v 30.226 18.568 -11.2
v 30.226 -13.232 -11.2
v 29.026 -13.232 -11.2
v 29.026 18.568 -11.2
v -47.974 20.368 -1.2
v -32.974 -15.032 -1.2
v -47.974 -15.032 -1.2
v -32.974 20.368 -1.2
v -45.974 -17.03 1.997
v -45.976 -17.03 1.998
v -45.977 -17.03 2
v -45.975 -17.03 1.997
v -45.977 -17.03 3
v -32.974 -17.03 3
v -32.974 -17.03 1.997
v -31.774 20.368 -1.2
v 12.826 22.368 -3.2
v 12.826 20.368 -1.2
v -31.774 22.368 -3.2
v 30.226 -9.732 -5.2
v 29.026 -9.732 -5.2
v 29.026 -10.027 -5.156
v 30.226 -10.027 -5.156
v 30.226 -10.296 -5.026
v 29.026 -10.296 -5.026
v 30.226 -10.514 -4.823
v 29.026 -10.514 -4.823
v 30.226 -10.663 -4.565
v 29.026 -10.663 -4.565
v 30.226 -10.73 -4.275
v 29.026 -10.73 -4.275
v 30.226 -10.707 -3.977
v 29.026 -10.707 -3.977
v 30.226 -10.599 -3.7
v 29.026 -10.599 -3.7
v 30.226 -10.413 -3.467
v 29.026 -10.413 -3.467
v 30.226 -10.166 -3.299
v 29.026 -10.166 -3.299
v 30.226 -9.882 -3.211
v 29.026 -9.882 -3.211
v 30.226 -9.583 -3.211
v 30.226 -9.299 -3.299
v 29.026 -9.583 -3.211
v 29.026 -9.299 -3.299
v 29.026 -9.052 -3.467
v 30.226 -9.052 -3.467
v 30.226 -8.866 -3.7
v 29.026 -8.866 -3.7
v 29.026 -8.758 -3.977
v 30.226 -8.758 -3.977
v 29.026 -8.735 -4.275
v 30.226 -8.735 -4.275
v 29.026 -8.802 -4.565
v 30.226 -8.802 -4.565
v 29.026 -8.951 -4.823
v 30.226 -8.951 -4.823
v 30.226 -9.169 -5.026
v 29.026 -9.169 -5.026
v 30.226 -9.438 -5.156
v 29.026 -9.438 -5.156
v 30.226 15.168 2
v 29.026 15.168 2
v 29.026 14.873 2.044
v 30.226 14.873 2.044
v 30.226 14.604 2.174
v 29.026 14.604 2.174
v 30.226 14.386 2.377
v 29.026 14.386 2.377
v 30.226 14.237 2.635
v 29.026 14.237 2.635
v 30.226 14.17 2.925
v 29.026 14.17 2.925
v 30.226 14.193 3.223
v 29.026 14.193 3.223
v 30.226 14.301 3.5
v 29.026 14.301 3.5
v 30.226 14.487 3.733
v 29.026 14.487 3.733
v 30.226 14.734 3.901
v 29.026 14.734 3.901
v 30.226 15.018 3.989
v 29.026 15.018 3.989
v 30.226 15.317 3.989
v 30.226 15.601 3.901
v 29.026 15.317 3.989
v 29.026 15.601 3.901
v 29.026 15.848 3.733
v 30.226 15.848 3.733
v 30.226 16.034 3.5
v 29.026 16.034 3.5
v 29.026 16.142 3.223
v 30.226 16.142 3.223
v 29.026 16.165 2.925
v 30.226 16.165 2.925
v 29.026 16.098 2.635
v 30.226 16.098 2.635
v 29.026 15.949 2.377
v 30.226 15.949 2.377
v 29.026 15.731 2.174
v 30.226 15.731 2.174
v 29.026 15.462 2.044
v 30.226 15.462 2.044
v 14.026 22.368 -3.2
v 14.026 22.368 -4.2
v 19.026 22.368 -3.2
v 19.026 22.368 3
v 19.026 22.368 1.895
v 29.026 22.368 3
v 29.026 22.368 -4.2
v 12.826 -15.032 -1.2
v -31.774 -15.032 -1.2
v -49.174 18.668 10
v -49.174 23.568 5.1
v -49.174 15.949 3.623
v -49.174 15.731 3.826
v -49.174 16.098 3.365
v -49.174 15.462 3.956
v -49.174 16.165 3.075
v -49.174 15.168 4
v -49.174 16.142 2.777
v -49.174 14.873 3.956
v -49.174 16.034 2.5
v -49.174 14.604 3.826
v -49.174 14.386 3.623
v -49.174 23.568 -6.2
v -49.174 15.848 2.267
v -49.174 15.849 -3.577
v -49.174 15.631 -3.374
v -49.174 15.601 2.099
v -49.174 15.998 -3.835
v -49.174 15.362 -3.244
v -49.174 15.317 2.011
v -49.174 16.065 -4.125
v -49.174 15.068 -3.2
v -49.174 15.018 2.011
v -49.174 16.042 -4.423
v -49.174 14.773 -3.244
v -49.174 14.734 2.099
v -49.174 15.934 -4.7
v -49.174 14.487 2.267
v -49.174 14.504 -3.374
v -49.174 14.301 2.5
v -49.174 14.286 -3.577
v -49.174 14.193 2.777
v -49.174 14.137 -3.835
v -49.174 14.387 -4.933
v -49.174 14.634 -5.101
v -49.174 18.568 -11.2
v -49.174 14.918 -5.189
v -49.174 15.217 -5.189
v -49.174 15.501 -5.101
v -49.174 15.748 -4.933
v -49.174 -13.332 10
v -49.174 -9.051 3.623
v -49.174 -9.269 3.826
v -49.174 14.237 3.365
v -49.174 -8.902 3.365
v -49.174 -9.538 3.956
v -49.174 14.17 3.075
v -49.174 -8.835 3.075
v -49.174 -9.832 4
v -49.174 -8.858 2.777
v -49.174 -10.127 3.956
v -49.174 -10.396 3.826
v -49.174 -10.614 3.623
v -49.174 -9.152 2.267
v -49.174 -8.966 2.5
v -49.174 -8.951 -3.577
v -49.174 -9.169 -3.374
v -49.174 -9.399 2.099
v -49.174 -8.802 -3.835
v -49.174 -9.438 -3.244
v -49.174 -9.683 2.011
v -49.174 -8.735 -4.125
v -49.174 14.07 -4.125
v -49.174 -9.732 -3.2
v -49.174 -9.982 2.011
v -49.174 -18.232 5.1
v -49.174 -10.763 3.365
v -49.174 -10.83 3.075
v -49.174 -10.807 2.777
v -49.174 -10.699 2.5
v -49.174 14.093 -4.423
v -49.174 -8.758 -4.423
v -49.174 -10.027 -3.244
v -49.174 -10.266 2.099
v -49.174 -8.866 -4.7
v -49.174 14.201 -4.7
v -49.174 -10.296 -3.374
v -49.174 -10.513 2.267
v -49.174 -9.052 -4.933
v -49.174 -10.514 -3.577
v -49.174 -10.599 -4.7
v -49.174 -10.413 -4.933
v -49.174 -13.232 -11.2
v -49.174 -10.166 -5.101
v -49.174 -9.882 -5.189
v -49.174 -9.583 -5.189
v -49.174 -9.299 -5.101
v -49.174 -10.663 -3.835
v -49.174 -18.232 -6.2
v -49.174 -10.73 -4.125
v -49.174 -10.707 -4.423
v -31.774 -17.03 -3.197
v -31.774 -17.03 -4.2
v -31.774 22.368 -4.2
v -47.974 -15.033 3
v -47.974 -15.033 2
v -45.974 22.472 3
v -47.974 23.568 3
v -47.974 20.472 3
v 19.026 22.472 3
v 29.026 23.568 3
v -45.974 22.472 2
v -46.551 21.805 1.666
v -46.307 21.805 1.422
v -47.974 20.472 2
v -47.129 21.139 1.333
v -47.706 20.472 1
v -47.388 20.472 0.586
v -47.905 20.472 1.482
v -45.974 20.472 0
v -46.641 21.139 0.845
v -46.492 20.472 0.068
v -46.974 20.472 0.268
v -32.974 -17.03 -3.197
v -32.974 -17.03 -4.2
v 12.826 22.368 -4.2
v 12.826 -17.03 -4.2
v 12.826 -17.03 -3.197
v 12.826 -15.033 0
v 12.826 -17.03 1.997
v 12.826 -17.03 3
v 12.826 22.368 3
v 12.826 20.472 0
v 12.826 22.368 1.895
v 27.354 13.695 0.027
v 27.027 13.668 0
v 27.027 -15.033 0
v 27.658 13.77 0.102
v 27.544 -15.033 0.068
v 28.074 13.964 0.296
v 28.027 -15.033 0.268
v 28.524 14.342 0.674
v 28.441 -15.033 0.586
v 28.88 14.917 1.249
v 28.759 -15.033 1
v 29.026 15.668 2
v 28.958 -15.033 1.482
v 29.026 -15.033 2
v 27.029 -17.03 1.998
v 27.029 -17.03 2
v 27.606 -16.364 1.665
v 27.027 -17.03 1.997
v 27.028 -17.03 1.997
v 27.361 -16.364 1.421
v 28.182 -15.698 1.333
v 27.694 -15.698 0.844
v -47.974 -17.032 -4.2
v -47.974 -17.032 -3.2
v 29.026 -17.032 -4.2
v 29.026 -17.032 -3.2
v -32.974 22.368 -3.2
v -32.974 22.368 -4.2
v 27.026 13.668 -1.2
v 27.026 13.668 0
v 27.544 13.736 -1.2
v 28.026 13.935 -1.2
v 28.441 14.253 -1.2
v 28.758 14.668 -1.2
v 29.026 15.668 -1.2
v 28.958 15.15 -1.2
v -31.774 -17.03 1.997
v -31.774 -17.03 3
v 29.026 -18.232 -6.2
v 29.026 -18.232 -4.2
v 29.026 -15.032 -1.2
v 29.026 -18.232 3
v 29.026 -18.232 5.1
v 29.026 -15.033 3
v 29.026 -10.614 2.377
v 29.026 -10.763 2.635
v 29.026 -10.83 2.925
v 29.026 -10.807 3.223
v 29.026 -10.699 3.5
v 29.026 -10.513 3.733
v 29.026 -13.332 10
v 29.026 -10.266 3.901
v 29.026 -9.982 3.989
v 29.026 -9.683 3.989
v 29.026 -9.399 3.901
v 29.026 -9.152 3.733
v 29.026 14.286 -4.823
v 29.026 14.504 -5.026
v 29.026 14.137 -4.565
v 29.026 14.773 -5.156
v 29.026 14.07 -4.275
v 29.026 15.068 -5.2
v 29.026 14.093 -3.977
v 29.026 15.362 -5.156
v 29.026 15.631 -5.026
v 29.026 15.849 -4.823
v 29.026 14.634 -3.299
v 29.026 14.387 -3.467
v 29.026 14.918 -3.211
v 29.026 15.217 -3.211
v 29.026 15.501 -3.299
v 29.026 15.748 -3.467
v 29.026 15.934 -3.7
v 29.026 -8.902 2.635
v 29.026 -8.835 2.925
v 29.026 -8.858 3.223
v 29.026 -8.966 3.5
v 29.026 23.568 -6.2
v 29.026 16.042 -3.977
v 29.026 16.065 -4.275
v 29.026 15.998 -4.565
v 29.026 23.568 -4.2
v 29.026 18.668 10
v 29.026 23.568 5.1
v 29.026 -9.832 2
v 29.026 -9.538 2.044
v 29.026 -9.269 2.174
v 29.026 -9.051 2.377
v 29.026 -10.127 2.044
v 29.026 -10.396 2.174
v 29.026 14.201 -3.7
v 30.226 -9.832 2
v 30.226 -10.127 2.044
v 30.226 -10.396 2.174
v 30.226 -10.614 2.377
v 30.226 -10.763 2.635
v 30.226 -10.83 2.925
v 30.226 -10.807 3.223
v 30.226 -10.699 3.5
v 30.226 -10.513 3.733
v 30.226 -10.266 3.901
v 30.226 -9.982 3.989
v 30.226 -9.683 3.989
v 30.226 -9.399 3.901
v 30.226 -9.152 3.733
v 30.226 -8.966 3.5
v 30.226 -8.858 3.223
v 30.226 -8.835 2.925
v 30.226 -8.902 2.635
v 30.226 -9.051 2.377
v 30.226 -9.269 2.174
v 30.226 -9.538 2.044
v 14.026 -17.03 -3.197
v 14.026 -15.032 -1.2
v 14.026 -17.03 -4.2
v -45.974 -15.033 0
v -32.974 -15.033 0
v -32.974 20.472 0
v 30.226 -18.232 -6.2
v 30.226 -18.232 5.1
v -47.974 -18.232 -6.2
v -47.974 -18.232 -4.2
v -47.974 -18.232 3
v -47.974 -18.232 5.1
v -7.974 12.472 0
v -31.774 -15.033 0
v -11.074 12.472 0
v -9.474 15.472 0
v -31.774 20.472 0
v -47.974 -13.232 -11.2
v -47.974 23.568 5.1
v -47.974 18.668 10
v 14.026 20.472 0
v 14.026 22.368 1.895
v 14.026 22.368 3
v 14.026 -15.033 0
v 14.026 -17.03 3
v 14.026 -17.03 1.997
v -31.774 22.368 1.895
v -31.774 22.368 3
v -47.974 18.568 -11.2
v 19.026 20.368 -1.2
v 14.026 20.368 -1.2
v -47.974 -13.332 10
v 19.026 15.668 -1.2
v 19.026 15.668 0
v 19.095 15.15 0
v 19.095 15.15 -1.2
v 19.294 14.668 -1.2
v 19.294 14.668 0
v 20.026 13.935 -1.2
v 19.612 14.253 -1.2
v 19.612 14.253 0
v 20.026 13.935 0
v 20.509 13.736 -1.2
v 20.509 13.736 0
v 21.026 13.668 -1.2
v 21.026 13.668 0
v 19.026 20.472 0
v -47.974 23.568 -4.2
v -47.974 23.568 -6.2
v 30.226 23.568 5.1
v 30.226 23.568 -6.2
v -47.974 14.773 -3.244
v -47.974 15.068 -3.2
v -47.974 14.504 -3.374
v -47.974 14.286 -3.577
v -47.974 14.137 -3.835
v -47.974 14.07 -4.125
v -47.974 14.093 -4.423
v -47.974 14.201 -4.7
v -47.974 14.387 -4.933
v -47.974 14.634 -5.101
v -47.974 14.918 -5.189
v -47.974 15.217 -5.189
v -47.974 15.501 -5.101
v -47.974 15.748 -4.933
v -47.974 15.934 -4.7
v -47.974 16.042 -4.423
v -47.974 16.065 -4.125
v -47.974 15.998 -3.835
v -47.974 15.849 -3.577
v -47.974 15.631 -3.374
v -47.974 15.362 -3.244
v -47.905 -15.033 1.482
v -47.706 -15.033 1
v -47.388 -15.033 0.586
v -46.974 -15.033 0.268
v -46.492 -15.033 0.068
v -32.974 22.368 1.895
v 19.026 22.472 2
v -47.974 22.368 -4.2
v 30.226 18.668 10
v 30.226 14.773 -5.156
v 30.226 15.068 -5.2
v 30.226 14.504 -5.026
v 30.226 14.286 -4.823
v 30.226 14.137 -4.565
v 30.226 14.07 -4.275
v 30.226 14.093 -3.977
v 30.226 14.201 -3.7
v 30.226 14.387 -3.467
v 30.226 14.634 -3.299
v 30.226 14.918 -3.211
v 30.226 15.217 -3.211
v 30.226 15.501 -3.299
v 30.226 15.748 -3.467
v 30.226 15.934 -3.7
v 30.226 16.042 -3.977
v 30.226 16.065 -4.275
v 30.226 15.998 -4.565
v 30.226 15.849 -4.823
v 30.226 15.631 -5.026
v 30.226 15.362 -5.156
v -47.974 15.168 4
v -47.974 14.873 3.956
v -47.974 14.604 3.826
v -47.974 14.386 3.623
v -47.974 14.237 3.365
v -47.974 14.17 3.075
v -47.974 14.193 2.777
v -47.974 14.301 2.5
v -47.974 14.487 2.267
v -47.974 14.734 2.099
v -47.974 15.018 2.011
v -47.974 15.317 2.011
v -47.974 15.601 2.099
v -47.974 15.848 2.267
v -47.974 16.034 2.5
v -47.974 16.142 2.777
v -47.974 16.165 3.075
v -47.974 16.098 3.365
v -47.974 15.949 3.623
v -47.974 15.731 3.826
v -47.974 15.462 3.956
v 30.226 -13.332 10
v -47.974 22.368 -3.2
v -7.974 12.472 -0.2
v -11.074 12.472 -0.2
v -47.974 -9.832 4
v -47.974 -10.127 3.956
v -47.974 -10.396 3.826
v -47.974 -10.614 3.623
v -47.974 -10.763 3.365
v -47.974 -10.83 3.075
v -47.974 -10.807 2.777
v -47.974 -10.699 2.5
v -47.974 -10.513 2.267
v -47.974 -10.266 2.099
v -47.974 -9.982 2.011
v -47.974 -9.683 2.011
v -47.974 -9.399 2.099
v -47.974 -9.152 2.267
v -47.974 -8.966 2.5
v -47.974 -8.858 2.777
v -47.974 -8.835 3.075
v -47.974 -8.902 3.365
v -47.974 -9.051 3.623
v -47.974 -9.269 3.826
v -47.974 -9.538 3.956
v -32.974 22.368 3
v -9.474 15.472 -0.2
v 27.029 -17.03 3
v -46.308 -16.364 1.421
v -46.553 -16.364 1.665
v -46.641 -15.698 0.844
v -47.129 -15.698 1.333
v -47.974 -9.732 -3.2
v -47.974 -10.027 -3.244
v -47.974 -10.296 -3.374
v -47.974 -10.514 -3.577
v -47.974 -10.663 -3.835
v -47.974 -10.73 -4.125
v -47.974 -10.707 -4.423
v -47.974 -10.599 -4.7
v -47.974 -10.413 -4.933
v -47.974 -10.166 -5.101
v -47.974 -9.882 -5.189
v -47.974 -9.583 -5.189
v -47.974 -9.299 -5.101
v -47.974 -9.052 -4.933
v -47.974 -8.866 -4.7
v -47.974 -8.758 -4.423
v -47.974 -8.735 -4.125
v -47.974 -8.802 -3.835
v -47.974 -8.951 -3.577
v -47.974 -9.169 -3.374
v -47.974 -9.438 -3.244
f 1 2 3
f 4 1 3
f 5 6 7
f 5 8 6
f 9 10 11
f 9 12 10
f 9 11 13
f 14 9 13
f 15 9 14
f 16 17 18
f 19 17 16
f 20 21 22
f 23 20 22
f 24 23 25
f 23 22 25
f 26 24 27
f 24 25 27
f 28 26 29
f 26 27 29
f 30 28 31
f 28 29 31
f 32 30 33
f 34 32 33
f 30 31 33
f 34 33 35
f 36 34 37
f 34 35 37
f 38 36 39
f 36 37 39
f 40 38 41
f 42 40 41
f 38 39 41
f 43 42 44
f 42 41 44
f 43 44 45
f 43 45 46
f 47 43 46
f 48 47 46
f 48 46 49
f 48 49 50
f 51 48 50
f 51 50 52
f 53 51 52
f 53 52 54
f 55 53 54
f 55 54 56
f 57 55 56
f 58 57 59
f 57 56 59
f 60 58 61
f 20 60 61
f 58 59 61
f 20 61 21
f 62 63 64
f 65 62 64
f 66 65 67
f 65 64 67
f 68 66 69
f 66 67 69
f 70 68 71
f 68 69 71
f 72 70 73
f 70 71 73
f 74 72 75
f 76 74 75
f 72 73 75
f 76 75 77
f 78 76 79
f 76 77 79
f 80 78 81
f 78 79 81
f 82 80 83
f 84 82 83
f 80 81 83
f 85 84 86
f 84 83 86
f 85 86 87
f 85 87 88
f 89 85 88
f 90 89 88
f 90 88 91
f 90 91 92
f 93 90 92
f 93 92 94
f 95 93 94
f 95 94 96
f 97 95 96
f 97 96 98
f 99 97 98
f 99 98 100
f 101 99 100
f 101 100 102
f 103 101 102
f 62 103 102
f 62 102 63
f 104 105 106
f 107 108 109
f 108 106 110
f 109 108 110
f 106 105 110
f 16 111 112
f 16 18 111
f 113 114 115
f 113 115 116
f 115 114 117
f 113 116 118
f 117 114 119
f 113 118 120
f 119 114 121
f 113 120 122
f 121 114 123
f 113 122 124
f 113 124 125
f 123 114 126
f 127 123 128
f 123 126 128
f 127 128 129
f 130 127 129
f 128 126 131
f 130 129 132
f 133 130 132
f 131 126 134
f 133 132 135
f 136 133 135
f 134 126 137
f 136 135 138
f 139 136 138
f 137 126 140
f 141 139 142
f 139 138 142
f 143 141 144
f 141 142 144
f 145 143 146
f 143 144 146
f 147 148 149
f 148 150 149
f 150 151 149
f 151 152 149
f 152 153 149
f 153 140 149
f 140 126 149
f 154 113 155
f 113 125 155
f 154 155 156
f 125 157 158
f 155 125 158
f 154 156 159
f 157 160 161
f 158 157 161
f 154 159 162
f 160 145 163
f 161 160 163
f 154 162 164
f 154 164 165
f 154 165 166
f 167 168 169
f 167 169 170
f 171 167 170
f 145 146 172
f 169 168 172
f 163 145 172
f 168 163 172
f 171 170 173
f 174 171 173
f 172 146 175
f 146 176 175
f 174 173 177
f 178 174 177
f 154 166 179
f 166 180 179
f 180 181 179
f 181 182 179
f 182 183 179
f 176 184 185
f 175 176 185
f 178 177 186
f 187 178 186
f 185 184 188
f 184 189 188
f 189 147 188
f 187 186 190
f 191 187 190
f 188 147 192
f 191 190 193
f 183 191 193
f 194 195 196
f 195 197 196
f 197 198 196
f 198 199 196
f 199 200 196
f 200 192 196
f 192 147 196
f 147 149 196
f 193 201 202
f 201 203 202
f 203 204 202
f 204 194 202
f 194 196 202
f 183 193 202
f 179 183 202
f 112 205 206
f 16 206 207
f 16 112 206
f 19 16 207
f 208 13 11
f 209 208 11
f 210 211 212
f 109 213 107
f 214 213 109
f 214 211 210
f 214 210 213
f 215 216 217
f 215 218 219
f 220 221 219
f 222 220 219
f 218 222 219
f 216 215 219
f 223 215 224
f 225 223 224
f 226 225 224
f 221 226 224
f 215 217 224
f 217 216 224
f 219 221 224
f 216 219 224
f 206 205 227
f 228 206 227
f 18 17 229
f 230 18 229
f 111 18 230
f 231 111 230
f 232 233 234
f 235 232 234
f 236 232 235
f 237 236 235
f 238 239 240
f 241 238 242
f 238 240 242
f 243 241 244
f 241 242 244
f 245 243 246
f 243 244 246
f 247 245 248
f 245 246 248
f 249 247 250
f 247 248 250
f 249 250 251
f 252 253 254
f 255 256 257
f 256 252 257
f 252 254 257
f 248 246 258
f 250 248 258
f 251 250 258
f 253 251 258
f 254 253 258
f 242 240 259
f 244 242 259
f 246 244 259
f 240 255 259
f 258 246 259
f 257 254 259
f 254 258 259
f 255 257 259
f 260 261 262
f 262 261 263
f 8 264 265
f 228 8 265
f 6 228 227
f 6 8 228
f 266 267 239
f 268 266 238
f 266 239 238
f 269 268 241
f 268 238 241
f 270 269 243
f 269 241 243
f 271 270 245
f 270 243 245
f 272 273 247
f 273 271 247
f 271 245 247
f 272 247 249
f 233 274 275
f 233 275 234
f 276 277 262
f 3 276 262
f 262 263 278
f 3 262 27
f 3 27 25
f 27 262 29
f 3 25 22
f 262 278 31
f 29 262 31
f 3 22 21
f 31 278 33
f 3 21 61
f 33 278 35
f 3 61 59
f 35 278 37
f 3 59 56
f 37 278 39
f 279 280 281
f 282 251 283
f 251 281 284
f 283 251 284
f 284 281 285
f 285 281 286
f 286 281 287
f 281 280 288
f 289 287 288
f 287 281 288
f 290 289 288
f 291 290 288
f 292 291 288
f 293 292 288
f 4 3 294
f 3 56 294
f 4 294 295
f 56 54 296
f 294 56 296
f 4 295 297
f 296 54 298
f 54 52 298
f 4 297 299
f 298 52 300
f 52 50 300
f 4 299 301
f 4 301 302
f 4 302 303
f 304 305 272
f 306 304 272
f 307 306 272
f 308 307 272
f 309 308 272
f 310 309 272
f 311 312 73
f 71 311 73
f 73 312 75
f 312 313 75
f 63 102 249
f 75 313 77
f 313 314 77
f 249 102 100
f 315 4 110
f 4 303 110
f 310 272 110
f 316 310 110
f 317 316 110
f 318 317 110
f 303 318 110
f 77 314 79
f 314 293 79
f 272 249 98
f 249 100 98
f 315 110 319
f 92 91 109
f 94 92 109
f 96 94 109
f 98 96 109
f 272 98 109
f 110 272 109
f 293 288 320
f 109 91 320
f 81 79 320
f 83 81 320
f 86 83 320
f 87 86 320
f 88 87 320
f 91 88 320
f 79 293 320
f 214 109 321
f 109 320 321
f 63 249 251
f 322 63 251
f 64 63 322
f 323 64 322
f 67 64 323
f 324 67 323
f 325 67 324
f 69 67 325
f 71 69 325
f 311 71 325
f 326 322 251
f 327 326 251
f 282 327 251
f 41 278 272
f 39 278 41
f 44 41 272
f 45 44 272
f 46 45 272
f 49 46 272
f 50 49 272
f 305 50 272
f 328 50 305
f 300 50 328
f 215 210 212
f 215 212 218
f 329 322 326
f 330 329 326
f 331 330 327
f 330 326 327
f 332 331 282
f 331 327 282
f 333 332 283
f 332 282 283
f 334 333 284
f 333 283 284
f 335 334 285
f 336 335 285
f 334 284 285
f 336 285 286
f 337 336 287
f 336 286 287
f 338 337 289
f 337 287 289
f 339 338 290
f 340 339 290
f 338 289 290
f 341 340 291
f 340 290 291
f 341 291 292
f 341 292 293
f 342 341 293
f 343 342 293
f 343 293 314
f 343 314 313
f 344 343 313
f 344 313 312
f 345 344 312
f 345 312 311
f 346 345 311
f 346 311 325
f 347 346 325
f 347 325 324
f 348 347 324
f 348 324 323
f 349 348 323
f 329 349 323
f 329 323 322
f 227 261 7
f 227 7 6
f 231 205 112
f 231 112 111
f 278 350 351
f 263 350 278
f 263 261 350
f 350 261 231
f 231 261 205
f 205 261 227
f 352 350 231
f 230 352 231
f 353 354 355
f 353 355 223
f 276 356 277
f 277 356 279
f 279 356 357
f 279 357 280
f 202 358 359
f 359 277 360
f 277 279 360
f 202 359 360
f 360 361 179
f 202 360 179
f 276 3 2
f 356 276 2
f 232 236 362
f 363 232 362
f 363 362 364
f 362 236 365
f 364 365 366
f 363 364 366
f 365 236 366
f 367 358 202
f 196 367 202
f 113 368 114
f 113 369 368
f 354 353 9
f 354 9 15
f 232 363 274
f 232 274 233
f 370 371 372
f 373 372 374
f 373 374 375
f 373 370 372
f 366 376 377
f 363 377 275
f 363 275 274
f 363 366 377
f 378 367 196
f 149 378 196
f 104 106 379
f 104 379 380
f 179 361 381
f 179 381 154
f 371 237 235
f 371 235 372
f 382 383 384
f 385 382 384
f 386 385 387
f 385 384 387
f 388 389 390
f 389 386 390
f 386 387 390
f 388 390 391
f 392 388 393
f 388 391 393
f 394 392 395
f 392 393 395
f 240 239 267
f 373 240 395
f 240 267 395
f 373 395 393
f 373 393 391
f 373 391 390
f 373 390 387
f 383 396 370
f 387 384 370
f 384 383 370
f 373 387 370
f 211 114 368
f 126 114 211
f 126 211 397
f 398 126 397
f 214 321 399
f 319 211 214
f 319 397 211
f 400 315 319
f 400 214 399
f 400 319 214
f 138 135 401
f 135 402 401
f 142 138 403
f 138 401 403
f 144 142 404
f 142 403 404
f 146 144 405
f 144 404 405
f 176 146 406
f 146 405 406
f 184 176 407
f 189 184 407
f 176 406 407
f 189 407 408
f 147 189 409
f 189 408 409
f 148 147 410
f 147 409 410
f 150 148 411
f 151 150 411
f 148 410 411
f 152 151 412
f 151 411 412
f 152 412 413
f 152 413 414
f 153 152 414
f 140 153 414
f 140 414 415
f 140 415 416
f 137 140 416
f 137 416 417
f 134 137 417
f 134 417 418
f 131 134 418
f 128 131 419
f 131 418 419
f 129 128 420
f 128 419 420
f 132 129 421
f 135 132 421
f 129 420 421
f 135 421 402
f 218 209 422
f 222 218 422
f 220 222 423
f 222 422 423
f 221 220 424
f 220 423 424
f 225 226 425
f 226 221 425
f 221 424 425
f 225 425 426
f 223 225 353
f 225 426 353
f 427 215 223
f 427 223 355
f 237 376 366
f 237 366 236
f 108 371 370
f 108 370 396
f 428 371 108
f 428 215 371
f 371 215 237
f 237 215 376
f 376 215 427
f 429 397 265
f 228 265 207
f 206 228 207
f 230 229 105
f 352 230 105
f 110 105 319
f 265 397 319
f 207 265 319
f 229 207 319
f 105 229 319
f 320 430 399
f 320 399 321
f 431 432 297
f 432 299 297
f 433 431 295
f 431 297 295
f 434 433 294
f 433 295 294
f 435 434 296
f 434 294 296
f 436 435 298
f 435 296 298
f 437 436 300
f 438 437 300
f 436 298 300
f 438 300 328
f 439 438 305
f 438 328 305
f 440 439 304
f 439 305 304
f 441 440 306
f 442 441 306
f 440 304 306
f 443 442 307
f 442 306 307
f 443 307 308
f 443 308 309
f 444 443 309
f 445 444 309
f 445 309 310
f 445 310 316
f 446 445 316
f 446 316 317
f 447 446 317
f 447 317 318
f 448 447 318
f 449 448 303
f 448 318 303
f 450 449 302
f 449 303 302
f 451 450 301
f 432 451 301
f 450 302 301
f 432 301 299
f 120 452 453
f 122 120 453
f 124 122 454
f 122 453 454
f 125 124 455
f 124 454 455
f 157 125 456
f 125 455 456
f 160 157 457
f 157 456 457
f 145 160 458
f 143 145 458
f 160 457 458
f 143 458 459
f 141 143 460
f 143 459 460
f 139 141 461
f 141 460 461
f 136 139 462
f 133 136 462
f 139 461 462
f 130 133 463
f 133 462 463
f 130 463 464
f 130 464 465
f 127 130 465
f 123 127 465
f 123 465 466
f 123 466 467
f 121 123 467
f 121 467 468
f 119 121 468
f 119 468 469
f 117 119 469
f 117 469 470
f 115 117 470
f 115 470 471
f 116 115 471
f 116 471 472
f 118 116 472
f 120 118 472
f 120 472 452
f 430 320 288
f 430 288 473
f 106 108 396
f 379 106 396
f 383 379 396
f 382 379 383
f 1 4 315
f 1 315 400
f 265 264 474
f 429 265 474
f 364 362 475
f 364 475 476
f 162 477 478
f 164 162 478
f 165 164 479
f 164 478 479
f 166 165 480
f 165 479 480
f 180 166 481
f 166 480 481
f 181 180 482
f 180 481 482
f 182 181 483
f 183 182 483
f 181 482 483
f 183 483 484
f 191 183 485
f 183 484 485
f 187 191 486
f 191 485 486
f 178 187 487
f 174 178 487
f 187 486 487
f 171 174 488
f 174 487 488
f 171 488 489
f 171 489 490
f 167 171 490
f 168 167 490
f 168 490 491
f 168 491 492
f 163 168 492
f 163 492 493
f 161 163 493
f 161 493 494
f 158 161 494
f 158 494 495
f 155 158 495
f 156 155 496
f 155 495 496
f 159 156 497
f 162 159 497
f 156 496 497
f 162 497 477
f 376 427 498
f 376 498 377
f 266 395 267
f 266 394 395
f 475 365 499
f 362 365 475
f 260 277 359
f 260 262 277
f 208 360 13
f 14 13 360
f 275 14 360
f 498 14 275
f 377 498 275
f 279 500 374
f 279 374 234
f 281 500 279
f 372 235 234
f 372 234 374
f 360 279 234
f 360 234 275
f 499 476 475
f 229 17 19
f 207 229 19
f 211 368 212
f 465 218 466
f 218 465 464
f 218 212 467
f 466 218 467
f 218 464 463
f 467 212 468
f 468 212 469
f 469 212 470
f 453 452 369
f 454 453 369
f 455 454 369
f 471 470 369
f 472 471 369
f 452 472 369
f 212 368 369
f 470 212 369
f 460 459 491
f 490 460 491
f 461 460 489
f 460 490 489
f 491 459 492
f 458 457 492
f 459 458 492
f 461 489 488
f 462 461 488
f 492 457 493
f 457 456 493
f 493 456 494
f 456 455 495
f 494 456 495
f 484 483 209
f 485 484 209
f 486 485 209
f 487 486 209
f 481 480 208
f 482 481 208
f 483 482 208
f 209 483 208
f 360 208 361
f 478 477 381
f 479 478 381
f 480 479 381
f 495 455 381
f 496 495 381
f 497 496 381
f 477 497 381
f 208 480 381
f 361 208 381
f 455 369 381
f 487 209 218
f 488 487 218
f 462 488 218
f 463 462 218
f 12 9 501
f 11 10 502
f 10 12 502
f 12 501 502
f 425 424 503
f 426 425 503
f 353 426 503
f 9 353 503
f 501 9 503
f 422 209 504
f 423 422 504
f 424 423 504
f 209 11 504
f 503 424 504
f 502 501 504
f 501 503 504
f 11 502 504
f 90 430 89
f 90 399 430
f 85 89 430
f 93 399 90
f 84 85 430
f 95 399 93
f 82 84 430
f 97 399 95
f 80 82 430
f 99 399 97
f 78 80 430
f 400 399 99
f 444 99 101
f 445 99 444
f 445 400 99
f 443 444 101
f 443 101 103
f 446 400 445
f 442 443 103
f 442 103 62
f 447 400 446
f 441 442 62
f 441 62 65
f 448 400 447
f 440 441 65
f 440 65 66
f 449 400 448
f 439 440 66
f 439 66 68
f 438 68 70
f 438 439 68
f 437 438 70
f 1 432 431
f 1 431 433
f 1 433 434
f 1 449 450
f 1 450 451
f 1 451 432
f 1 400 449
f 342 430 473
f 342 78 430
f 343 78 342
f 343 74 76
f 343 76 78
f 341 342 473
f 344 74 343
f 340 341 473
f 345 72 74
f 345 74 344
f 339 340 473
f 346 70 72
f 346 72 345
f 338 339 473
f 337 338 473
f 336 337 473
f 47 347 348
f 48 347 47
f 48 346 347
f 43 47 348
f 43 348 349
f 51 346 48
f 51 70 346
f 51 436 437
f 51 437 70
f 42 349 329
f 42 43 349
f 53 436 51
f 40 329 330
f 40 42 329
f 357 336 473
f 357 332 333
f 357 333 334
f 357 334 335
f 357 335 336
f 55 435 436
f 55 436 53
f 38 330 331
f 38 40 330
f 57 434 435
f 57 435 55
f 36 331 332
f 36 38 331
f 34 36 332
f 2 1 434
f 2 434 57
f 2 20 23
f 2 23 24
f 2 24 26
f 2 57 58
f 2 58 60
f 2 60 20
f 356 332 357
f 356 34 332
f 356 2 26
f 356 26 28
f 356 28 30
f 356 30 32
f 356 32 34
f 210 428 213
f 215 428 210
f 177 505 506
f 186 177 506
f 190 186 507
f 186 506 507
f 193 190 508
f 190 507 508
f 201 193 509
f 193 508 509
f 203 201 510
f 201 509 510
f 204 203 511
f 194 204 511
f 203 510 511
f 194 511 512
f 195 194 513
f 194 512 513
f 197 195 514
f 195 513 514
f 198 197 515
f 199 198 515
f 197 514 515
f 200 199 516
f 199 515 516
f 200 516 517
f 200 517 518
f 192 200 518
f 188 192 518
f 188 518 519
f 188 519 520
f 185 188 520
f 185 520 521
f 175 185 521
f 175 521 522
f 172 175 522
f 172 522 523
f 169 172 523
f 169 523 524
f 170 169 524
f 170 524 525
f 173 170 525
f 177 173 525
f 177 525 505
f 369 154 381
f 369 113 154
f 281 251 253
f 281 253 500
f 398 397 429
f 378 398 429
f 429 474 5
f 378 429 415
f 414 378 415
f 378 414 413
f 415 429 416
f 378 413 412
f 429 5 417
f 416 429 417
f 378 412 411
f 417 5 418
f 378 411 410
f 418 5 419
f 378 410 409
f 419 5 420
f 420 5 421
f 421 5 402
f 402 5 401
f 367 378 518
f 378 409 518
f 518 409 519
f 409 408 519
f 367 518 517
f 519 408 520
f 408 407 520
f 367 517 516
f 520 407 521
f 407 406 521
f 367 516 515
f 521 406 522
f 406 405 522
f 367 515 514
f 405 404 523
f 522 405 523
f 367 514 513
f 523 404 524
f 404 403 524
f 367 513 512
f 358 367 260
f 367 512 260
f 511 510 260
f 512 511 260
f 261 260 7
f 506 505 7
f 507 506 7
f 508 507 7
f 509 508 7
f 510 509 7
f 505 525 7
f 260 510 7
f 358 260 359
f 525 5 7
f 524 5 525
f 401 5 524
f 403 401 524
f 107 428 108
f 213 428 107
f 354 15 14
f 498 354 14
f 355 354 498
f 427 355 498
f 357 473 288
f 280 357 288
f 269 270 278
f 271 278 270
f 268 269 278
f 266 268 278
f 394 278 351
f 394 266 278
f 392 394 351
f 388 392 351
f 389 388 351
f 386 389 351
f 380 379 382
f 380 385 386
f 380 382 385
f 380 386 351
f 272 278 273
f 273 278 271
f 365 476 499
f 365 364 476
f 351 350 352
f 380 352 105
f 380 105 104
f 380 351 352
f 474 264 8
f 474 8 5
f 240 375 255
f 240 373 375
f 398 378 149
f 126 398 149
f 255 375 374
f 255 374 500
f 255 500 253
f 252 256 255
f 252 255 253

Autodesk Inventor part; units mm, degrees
ref_plane "YZ Plane" through (0, 0, 0) normal (1, 0, 0) x (0, 1, 0)
ref_plane "XZ Plane" through (0, 0, 0) normal (0, 1, 0) x (-1, 0, 0)
ref_plane "XY Plane" through (0, 0, 0) normal (0, 0, 1) x (1, 0, 0)
sketch "Sketch1" plane through (0, 0, 0) normal (0, 0, 1) x (1, 0, 0)
  line L0 (-49.4736, 23.6675) -> (30.5264, 23.6675)
  line L1 (30.5264, 23.6675) -> (30.5264, -18.3325)
  line L2 (30.5264, -18.3325) -> (-49.4736, -18.3325)
  line L3 (-49.4736, -18.3325) -> (-49.4736, 23.6675)
  line L4 (-47.9736, 22.4675) -> (29.0264, 22.4675)
  line L5 (29.0264, 22.4675) -> (29.0264, -17.1325)
  line L6 (29.0264, -17.1325) -> (-47.9736, -17.1325)
  line L7 (-47.9736, -17.1325) -> (-47.9736, 22.4675)
  point P0 (0, 0)
  dimension "d0" = 80
  dimension "d1" = 42
  dimension "d2" = 1.5
  dimension "d3" = 1.5
  dimension "d4" = 1.2
  dimension "d5" = 1.2
extrude "Extrusion1" add sketch "Sketch1" along normal blind 10
sketch "Sketch2" plane through (0, 0, 10) normal (0, 0, 1) x (1, 0, 0)
  line L0 (-47.9736, -18.3325) -> (29.0264, -18.3325)
  line L1 (29.0264, -18.3325) -> (29.0264, 23.6675)
  line L2 (29.0264, 23.6675) -> (-47.9736, 23.6675)
  line L3 (-47.9736, 23.6675) -> (-47.9736, -18.3325)
  line L4 (-47.9736, -17.1325) -> (-47.9736, 22.4675) projected
  line L5 (29.0264, 22.4675) -> (29.0264, -17.1325) projected
  line L6 (30.5264, 23.6675) -> (-49.4736, 23.6675) projected
  line L7 (-49.4736, -18.3325) -> (30.5264, -18.3325) projected
  point P0 (0, 0)
extrude "Extrusion2" cut sketch "Sketch2" against normal blind 10
sketch "Sketch3" plane through (0, 0, 10) normal (0, 0, 1) x (1, 0, 0)
  line L0 (-60.7413, 24.2408) -> (-49.3736, 24.2408)
  line L1 (-49.3736, 24.2408) -> (-49.3736, -19.8756)
  line L2 (-49.3736, -19.8756) -> (-60.7413, -19.8756)
  line L3 (-60.7413, -19.8756) -> (-60.7413, 24.2408)
  line L4 (46.8098, -23.8693) -> (30.4264, -23.8693)
  line L5 (30.4264, -23.8693) -> (30.4264, 25.2624)
  line L6 (30.4264, 25.2624) -> (46.8098, 25.2624)
  line L7 (46.8098, 25.2624) -> (46.8098, -23.8693)
  line L8 (-49.4736, 23.6675) -> (-49.4736, -18.3325) projected
  line L9 (30.5264, -18.3325) -> (30.5264, 23.6675) projected
  point P0 (0, 0)
  dimension "d10" = 0.1
  dimension "d11" = 0.1
extrude "Extrusion3" cut sketch "Sketch3" against normal blind 10
sketch "Sketch4" plane through (30.4264, -18.3325, 10) normal (1, 0, 0) x (0, 0, -1)
  line L0 (10, 42) -> (10, 0) projected
  line L1 (0, 42) -> (10, 42) projected
  line L2 (10, 0) -> (0, 0) projected
  point P0 (10, 18.3325)
  point P1 (7, 33.5)
  point P2 (7, 8.5)
  dimension "d14" = 3
  dimension "d15" = 3
  dimension "d16" = 8.5
  dimension "d17" = 8.5
hole "Hole1" at (30.4264, 15.1675, 3) at (30.4264, -9.8325, 3) direction (-1, 0, 0) diameter 2 depth 10 tip angle 179
sketch "Sketch5" plane through (-49.3736, -18.3325, 10) normal (-1, 0, 0) x (0, 0, 1)
  circle A0 centre (-7, 33.5) radius 1 projected
  circle A1 centre (-7, 8.5) radius 1 projected
  point P0 (-10, 18.3325)
hole "Hole2" at (-49.3736, 15.1675, 3) at (-49.3736, -9.8325, 3) direction (1, 0, 0) diameter 2 depth 10 tip angle 179
chamfer "Chamfer1" distance 5 angle 45 4 edges at (-48.6736, 23.6675, 10) (-48.6736, -18.3325, 10) (29.7264, -18.3325, 10) (29.7264, 23.6675, 10)
sketch "Sketch6" plane through (0, 0, 0) normal (0, 0, -1) x (-1, 0, 0)
  line L0 (-30.4264, 23.6675) -> (-30.4264, -18.3325) projected
  line L1 (49.3736, -18.3325) -> (47.9736, -18.3325) projected
  line L2 (-30.4264, 23.6675) -> (49.3736, 23.6675)
  line L3 (49.3736, 23.6675) -> (49.3736, -18.3325)
  line L4 (49.3736, -18.3325) -> (-30.4264, -18.3325)
  line L5 (-30.4264, -18.3325) -> (-30.4264, 23.6675)
  point P0 (0, 0)
  point P1 (-30.4264, -18.3325)
extrude "Extrusion4" add sketch "Sketch6" along normal blind 1.2
sketch "Sketch7" plane through (0, 0, -1.2) normal (0, 0, -1) x (-1, 0, 0)
  line L0 (-29.0264, -18.3325) -> (-29.0264, 23.6675) projected
  line L1 (-29.0264, 23.6675) -> (-19.0264, 23.6675)
  line L2 (-19.0264, 23.6675) -> (-19.0264, 13.6675)
  line L3 (-19.0264, 13.6675) -> (-29.0264, 13.6675)
  line L4 (-29.0264, 13.6675) -> (-29.0264, 23.6675)
  point P0 (0, 0)
  dimension "d37" = 10
  dimension "d38" = 10
extrude "Extrusion5" cut sketch "Sketch7" against normal blind 1.2
fillet "Fillet1" radius 2 2 edges at (19.0264, 13.6675, -0.6) (29.0264, 13.6675, -0.6)
sketch "Sketch9" plane through (0, 0, 0) normal (0, 0, 1) x (1, 0, 0)
  line L0 (42.1128, -25.2677) -> (-53.8311, -25.2677)
  line L1 (-53.8311, -25.2677) -> (-53.8311, -18.2325)
  line L2 (-53.8311, -18.2325) -> (42.1128, -18.2325)
  line L3 (42.1128, -18.2325) -> (42.1128, -25.2677)
  line L4 (-54.7833, 25.6339) -> (39.9156, 25.6339)
  line L5 (39.9156, 25.6339) -> (39.9156, 23.5675)
  line L6 (39.9156, 23.5675) -> (-54.7833, 23.5675)
  line L7 (-54.7833, 23.5675) -> (-54.7833, 25.6339)
  line L8 (29.0264, -18.3325) -> (-47.9736, -18.3325) projected
  line L9 (-47.9736, 23.6675) -> (19.0264, 23.6675) projected
  point P0 (0, 0)
  dimension "d56" = 0.1
  dimension "d57" = 0.1
extrude "Extrusion7" cut sketch "Sketch9" along normal mid plane 50
fillet "Fillet2" radius 2 2 edges at (-47.9736, 2.6675, 0) (29.0264, -1.2825, 0)
sketch "Sketch10" plane through (0, 0, 0) normal (0, 0, 1) x (1, 0, 0)
  line L0 (-47.9736, 23.5675) -> (-47.9736, 15.1675) projected
  line L1 (19.0264, 23.5675) -> (19.0264, 15.6675) projected
  line L2 (-47.9736, 23.5675) -> (19.0264, 23.5675)
  line L3 (19.0264, 23.5675) -> (19.0264, 22.4717)
  line L4 (19.0264, 22.4717) -> (-47.9736, 22.4717)
  line L5 (-47.9736, 22.4717) -> (-47.9736, 23.5675)
  line L6 (29.0264, -18.2325) -> (29.0264, -9.8325) projected
  line L7 (-47.9736, -9.8325) -> (-47.9736, -18.2325) projected
  line L8 (29.0264, -18.2325) -> (-47.9736, -18.2325)
  line L9 (-47.9736, -18.2325) -> (-47.9736, -17.0297)
  line L10 (-47.9736, -17.0297) -> (29.0264, -17.0297)
  line L11 (29.0264, -17.0297) -> (29.0264, -18.2325)
  point P0 (0, 0)
  point P1 (29.0264, -17.0297)
extrude "Extrusion8" add sketch "Sketch10" along normal blind 3
sketch "Sketch13" plane through (0, 0, -1.2) normal (0, 0, -1) x (-1, 0, 0)
  line L0 (-31.9264, 25.0675) -> (50.8736, 25.0675)
  line L1 (50.8736, 25.0675) -> (50.8736, -19.7325)
  line L2 (50.8736, -19.7325) -> (-31.9264, -19.7325)
  line L3 (-31.9264, -19.7325) -> (-31.9264, 25.0675)
  line L4 (49.3736, 23.5675) -> (-19.0264, 23.5675) projected
  line L5 (-30.4264, -18.2325) -> (49.3736, -18.2325) projected
  line L6 (-30.4264, 23.5675) -> (-30.4264, -18.2325) projected
  line L7 (49.3736, -18.2325) -> (49.3736, 23.5675) projected
  line L8 (-30.4264, 23.5675) -> (49.3736, 23.5675)
  line L9 (49.3736, 23.5675) -> (49.3736, -18.2325)
  line L10 (49.3736, -18.2325) -> (-30.4264, -18.2325)
  line L11 (-30.4264, -18.2325) -> (-30.4264, 23.5675)
  point P0 (0, 0)
  dimension "d81" = 1.5
  dimension "d82" = 1.5
  dimension "d83" = 1.5
  dimension "d84" = 1.5
extrude "Extrusion11" add sketch "Sketch13" against normal blind 1.2
fillet "Fillet3" radius 2 3 edges at (31.9264, 25.0675, -0.6) (-50.8736, 25.0675, -0.6) (31.9264, -19.7325, -0.6)
fillet "Fillet4" radius 2 1 edges at (-50.8736, -19.7325, -0.6)
sketch "Sketch14" plane through (0, 0, -1.2) normal (0, 0, -1) x (-1, 0, 0)
  line L0 (-30.4264, 23.5675) -> (-29.0264, 23.5675) projected
  line L1 (-30.4264, -18.2325) -> (-30.4264, 23.5675) projected
  line L2 (-29.0264, 23.5675) -> (-30.4264, 23.5675)
  line L3 (-30.4264, 23.5675) -> (-30.4264, -18.2325)
  line L4 (-30.4264, -18.2325) -> (-29.0264, -18.2325)
  line L5 (-29.0264, -18.2325) -> (-29.0264, 23.5675)
  line L6 (49.3736, -18.2325) -> (47.9736, -18.2325) projected
  line L7 (49.3736, 23.5675) -> (49.3736, -18.2325) projected
  line L8 (47.9736, -18.2325) -> (49.3736, -18.2325)
  line L9 (49.3736, -18.2325) -> (49.3736, 23.5675)
  line L10 (49.3736, 23.5675) -> (47.9736, 23.5675)
  line L11 (47.9736, 23.5675) -> (47.9736, -18.2325)
  line L12 (-31.9264, 23.0675) -> (-31.9264, -17.7325) projected
  line L13 (48.8736, 25.0675) -> (-29.9264, 25.0675) projected
  point P0 (0, 0)
  dimension "d89" = 1.5
  dimension "d90" = 1.5
extrude "Extrusion12" add sketch "Sketch14" along normal blind 10
sketch "Sketch15" plane through (30.4264, -18.2325, -1.2) normal (1, 0, 0) x (0, 0, -1)
  line L0 (0, 41.8) -> (10, 41.8) projected
  line L1 (0, 0) -> (10, 0) projected
  line L2 (0, 41.3) -> (0, 0.5) projected
  point P0 (-1.2, 18.2325)
  point P1 (3, 33.3)
  point P2 (3, 8.5)
  point P3 (5, 41.8)
  point P4 (5, 0)
  dimension "d96" = 8.5
  dimension "d97" = 8.5
  dimension "d98" = 3
  dimension "d99" = 3
hole "Hole3" at (30.4264, 15.0675, -4.2) at (30.4264, -9.7325, -4.2) direction (-1, 0, 0) diameter 2 depth 10 tip angle 179
sketch "Sketch16" plane through (-49.3736, -18.2325, -1.2) normal (-1, 0, 0) x (0, 0, 1)
  circle A0 centre (-3, 33.3) radius 1 projected
  circle A1 centre (-3, 8.5) radius 1 projected
  point P0 (1.2, 18.2325)
hole "Hole4" at (-49.3736, 15.0675, -4.2) at (-49.3736, -9.7325, -4.2) direction (1, 0, 0) diameter 2 depth 10 tip angle 179
chamfer "Chamfer4" distance 5 angle 45 4 edges at (29.7264, 23.5675, -11.2) (-48.6736, 23.5675, -11.2) (29.7264, -18.2325, -11.2) (-48.6736, -18.2325, -11.2)
chamfer "Chamfer5" distance 2 angle 45 5 edges at (-9.4736, -17.0297, 0) (28.4408, -17.0297, 0.5856) (29.0264, -17.0297, 2.4998) (-47.3879, -17.0297, 0.5856) (-47.9736, -17.0297, 2.4998)
chamfer "Chamfer6" distance 2 angle 45 2 edges at (-13.4738, 22.4717, 0) (-47.3879, 22.4717, 0.5856)
sketch "Sketch17" plane through (0, 0, -1.2) normal (0, 0, -1) x (-1, 0, 0)
  line L0 (-19.0264, 23.5675) -> (47.9736, 23.5675) projected
  line L1 (47.9736, 23.5675) -> (-19.0264, 23.5675)
  line L2 (-19.0264, 23.5675) -> (-19.0264, 22.3675)
  line L3 (-19.0264, 22.3675) -> (47.9736, 22.3675)
  line L4 (47.9736, 22.3675) -> (47.9736, 23.5675)
  line L5 (-29.0264, -15.0297) -> (-29.0264, -18.2325) projected
  line L6 (-29.0264, -18.2325) -> (47.9736, -18.2325)
  line L7 (47.9736, -18.2325) -> (47.9736, -17.0325)
  line L8 (47.9736, -17.0325) -> (-29.0264, -17.0325)
  line L9 (-29.0264, -17.0325) -> (-29.0264, -18.2325)
  line L10 (-19.0264, 23.5675) -> (-19.0264, 15.6675) projected
  point P0 (0, 0)
  point P1 (-29.0264, -17.0325)
  dimension "d123" = 1.2
  dimension "d124" = 1.2
extrude "Extrusion13" add sketch "Sketch17" along normal blind 3
chamfer "Chamfer7" distance 2 angle 45 1 edges at (-14.4736, 22.3675, -1.2)
chamfer "Chamfer8" distance 2 angle 45 1 edges at (-9.4736, -17.0325, -1.2)
sketch "Sketch19" plane through (0, 0, -1.2) normal (0, 0, -1) x (-1, 0, 0)
  line L0 (-30.4264, -18.2325) -> (-30.4264, 23.5675) projected
  line L1 (47.9736, -18.2325) -> (49.3736, -18.2325) projected
  line L2 (-30.4264, 23.5675) -> (49.3736, 23.5675)
  line L3 (49.3736, 23.5675) -> (49.3736, -18.2325)
  line L4 (49.3736, -18.2325) -> (-30.4264, -18.2325)
  line L5 (-30.4264, -18.2325) -> (-30.4264, 23.5675)
  line L6 (55.2974, -21.7914) -> (-35.5213, -21.7914)
  line L7 (-35.5213, -21.7914) -> (-35.5213, 27.2078)
  line L8 (-35.5213, 27.2078) -> (55.2974, 27.2078)
  line L9 (55.2974, 27.2078) -> (55.2974, -21.7914)
  point P0 (0, 0)
extrude "Extrusion14" cut sketch "Sketch19" against normal blind 3
sketch "Sketch20" plane through (0, 0, -1.2) normal (0, 0, -1) x (-1, 0, 0)
  line L0 (-19.0264, 22.4717) -> (45.9736, 22.4717) projected
  line L1 (-27.0264, -17.0297) -> (45.9736, -17.0297) projected
  line L2 (-14.0264, 22.4717) -> (-12.8264, 22.4717)
  line L3 (-12.8264, 22.4717) -> (-12.8264, -17.0297)
  line L4 (-12.8264, -17.0297) -> (-14.0264, -17.0297)
  line L5 (-14.0264, -17.0297) -> (-14.0264, 22.4717)
  line L6 (31.7736, 22.4717) -> (32.9736, 22.4717)
  line L7 (32.9736, 22.4717) -> (32.9736, -17.0297)
  line L8 (32.9736, -17.0297) -> (31.7736, -17.0297)
  line L9 (31.7736, -17.0297) -> (31.7736, 22.4717)
  line L10 (-29.0264, -13.2325) -> (-29.0264, 18.5675) projected
  line L11 (47.9736, 18.5675) -> (47.9736, -13.2325) projected
  point P0 (0, 0)
  point P1 (32.9736, -17.0297)
  dimension "d135" = 1.2
  dimension "d136" = 1.2
  dimension "d137" = 15
  dimension "d138" = 15
extrude "Extrusion15" add sketch "Sketch20" along normal blind 3 contours L0 L3 L1 L5 | L0 L7 L1 L9
sketch "Sketch21" plane through (0, 0, 0) normal (0, 0, 1) x (1, 0, 0)
  line L0 (-32.9736, 22.3675) -> (-32.9736, 20.3675) projected
  line L1 (-32.9736, -17.0297) -> (-31.7736, -17.0297) projected
  line L2 (-32.9736, 22.3675) -> (-31.7736, 22.3675)
  line L3 (-31.7736, 22.3675) -> (-31.7736, -17.0297)
  line L4 (-31.7736, -17.0297) -> (-32.9736, -17.0297)
  line L5 (-32.9736, -17.0297) -> (-32.9736, 22.3675)
  line L6 (14.0264, 22.3675) -> (14.0264, -17.0297) projected
  line L7 (12.8264, -17.0297) -> (12.8264, 22.3675) projected
  line L8 (14.0264, -17.0297) -> (12.8264, -17.0297)
  line L9 (12.8264, -17.0297) -> (12.8264, 22.3675)
  line L10 (12.8264, 22.3675) -> (14.0264, 22.3675)
  line L11 (14.0264, 22.3675) -> (14.0264, -17.0297)
  point P0 (0, 0)
extrude "Extrusion16" add sketch "Sketch21" along normal blind 3
sketch "Sketch22" plane through (0, 0, -11.2) normal (0, 0, -1) x (-1, 0, 0)
  line L0 (-43.9257, 27.8444) -> (-30.2264, 27.8444)
  line L1 (-30.2264, 27.8444) -> (-30.2264, -19.4315)
  line L2 (-30.2264, -19.4315) -> (-43.9257, -19.4315)
  line L3 (-43.9257, -19.4315) -> (-43.9257, 27.8444)
  line L4 (58.4435, 29.8546) -> (49.1736, 29.8546)
  line L5 (49.1736, 29.8546) -> (49.1736, -19.4315)
  line L6 (49.1736, -19.4315) -> (58.4435, -19.4315)
  line L7 (58.4435, -19.4315) -> (58.4435, 29.8546)
  line L8 (-30.4264, 23.5675) -> (-30.4264, 18.5675) projected
  line L9 (49.3736, 18.5675) -> (49.3736, 23.5675) projected
  point P0 (0, 0)
  dimension "d143" = 0.2
  dimension "d144" = 0.2
extrude "Extrusion17" cut sketch "Sketch22" against normal blind 30
sketch "Sketch23" plane through (-47.9736, 23.5675, 3) normal (0, 1, 0) x (1, 0, 0)
  line L0 (67, 7.2) -> (67, 0) projected
  line L1 (0, 7.2) -> (77, 7.2) projected
  line L2 (67, 0) -> (77, 0)
  line L3 (77, 0) -> (77, 7.2)
  line L4 (77, 7.2) -> (67, 7.2)
  line L5 (67, 7.2) -> (67, 0)
  point P0 (47.9736, 3)
extrude "Extrusion18" add sketch "Sketch23" against normal blind 1.2
sketch "Sketch24" plane through (0, 0, 0) normal (0, 0, 1) x (1, 0, 0)
  line L0 (-31.7736, 20.4717) -> (12.8264, 20.4717) projected
  line L1 (-9.4736, 15.4717) -> (-7.9736, 12.4717)
  line L2 (-7.9736, 12.4717) -> (-11.0743, 12.4717)
  line L3 (-11.0743, 12.4717) -> (-9.4736, 15.4717)
  point P0 (0, 0)
  point P1 (-9.4736, 20.4717)
  dimension "d149" = 3
  dimension "d150" = 3
  dimension "d151" = 1.5
  dimension "d152" = 0
  dimension "d153" = 5
extrude "Extrusion19" cut sketch "Sketch24" against normal blind 0.2
properties part number "screen cover backplate"
